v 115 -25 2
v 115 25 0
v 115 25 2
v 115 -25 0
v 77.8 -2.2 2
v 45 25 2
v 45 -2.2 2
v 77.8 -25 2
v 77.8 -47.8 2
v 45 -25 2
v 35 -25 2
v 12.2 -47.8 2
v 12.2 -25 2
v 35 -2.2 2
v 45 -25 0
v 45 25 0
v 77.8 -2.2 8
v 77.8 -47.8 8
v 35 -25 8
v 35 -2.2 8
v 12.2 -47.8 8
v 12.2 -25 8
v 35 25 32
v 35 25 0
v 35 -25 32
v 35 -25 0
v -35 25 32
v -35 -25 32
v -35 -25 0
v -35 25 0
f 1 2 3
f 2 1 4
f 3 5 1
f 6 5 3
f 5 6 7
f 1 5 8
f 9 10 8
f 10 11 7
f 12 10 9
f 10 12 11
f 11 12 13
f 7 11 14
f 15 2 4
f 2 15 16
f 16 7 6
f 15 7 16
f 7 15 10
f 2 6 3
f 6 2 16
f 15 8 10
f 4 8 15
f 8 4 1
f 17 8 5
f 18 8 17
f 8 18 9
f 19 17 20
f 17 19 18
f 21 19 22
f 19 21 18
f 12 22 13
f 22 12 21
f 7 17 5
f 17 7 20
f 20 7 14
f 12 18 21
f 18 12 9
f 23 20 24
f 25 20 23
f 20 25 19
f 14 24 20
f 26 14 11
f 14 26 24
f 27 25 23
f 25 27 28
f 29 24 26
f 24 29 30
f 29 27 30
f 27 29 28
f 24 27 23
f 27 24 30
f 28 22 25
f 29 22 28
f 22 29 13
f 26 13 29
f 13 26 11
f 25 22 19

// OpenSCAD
// Two-part enclosure for a small electronics board (e.g. Arduino-based temperature logger)
// Print orientation: both parts rest on the bed (z = 0), build upward, side by side.
// The lid is printed upside down: a flat plate with a rectangular lip on top that slides
// into the open-top box.

// ---------------- Parameters ----------------
box_x      = 70;    // box outer length (X)
box_y      = 50;    // box outer width (Y)
box_z      = 30;    // box outer height (Z)
box_wall   = 2;     // box side wall thickness
box_floor  = 2;     // box floor thickness

lip_t      = 1.5;   // lip wall thickness
lip_h      = 4;     // lip height above the plate
lip_x      = 65.6;  // lip outer length (X)
lip_y      = 45.6;  // lip outer width (Y)
lip_clear  = 0.2;   // clearance between lip inner size and box opening (each side)

plate_t    = 2;     // lid plate thickness
gap        = 10;    // gap between box and lid on the bed
eps        = 0.5;   // cutter overshoot past faces

$fn = 64;

// ---------------- Model ----------------
union() {
    // Part 1: Box (open top)
    translate([-box_x/2, -box_y/2, 0])
        cube([box_x, box_y, box_z + box_floor]);

    // Part 2: Lid (plate + lip, printed upside down)
    translate([box_x/2 + gap, -box_y/2, 0])
        union() {
            // Plate
            cube([box_x, box_y, plate_t]);
            // Lip: 1.5 mm wall, 4 mm tall, centred on the plate
            translate([-lip_x/2, -lip_y/2, plate_t])
                cube([lip_x, lip_y, plate_t + lip_h]);
        }
}
